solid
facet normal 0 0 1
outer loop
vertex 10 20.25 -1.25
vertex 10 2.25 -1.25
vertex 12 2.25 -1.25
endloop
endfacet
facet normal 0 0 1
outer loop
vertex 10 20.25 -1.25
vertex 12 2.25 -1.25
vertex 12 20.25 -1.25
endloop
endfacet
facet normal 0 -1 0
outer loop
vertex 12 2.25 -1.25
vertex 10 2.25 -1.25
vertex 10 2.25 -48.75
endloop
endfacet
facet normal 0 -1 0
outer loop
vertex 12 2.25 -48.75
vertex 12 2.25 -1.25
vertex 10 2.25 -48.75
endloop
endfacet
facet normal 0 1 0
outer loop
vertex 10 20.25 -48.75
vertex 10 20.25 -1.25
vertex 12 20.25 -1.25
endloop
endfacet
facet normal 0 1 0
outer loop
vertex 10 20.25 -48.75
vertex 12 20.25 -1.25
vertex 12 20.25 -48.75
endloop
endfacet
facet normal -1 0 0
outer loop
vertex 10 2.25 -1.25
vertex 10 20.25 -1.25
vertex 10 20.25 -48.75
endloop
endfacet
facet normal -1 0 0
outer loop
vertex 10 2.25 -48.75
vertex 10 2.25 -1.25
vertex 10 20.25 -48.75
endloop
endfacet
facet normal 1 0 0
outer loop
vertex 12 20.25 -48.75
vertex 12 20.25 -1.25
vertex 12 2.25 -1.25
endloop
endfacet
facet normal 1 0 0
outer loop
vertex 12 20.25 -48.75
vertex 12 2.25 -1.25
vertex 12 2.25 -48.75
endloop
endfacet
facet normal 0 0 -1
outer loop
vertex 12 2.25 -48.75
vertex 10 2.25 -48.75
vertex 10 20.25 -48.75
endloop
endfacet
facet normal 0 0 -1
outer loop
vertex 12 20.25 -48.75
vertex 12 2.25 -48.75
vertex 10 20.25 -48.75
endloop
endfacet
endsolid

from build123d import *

# Parameters (mm, degrees)
SKETCH2_W           = 50
SKETCH2_H           = 22.5
BOSS_EXTRUDE1_DEPTH = 10
USBC_DEPTH          = 10
POGO_DEPTH          = 10
SKETCH6_W           = 48
SKETCH6_H           = 18.5
CUT_EXTRUDE3_DEPTH  = 8
SKETCH7_W           = 47.5
SKETCH7_H           = 18
BOSS_EXTRUDE2_DEPTH = 2
SKETCH8_W           = 10
SKETCH8_H           = 22.5
CUT_EXTRUDE4_DEPTH  = 57.127087934


with BuildPart() as part:
    # Sketch2 → Boss-Extrude1 (new body)
    with BuildSketch(Plane(origin=(0, 0, 0), x_dir=(0, 0, -1), z_dir=(1, 0, 0))):
        with Locations((25, 11.25)):
            Rectangle(SKETCH2_W, SKETCH2_H)
    extrude(amount=BOSS_EXTRUDE1_DEPTH)

    # Sketch4 → USBC (cut)
    with BuildSketch(Plane.XY):
        with BuildLine():
            Line((7.05, 14.275), (7.05, 8.225))
            ThreePointArc((7.05, 8.225), (5.325, 6.5), (3.6, 8.225))
            Line((3.6, 8.225), (3.6, 14.275))
            ThreePointArc((3.6, 14.275), (5.325, 16), (7.05, 14.275))
        make_face()
    extrude(amount=-USBC_DEPTH, mode=Mode.SUBTRACT)

    # Sketch5 → POGO (cut)
    with BuildSketch(Plane(origin=(0, 0, -50), x_dir=(-1, 0, 0), z_dir=(0, 0, -1))):
        with BuildLine():
            Line((-3, 16.25), (-3, 6.25))
            ThreePointArc((-3, 6.25), (-5.225, 4.025), (-7.45, 6.25))
            Line((-7.45, 6.25), (-7.45, 16.25))
            ThreePointArc((-7.45, 16.25), (-5.225, 18.475), (-3, 16.25))
        make_face()
    extrude(amount=-POGO_DEPTH, mode=Mode.SUBTRACT)

    # Sketch6 → Cut-Extrude3 (cut)
    with BuildSketch(Plane(origin=(10, 0, 0), x_dir=(0, 0, -1), z_dir=(1, 0, 0))):
        with Locations((25, 11.25)):
            Rectangle(SKETCH6_W, SKETCH6_H)
    extrude(amount=-CUT_EXTRUDE3_DEPTH, mode=Mode.SUBTRACT)

    # Sketch8 → Cut-Extrude4 (cut, through all)
    with BuildSketch(Plane.XY):
        with Locations((5, 11.25)):
            Rectangle(SKETCH8_W, SKETCH8_H)
    extrude(amount=-CUT_EXTRUDE4_DEPTH, mode=Mode.SUBTRACT)


with BuildPart() as body_2:
    # Sketch7 → Boss-Extrude2 (new body)
    with BuildSketch(Plane(origin=(10, 0, 0), x_dir=(0, 0, -1), z_dir=(1, 0, 0))):
        with Locations((25, 11.25)):
            Rectangle(SKETCH7_W, SKETCH7_H)
    extrude(amount=BOSS_EXTRUDE2_DEPTH)


solid = body_2.part
